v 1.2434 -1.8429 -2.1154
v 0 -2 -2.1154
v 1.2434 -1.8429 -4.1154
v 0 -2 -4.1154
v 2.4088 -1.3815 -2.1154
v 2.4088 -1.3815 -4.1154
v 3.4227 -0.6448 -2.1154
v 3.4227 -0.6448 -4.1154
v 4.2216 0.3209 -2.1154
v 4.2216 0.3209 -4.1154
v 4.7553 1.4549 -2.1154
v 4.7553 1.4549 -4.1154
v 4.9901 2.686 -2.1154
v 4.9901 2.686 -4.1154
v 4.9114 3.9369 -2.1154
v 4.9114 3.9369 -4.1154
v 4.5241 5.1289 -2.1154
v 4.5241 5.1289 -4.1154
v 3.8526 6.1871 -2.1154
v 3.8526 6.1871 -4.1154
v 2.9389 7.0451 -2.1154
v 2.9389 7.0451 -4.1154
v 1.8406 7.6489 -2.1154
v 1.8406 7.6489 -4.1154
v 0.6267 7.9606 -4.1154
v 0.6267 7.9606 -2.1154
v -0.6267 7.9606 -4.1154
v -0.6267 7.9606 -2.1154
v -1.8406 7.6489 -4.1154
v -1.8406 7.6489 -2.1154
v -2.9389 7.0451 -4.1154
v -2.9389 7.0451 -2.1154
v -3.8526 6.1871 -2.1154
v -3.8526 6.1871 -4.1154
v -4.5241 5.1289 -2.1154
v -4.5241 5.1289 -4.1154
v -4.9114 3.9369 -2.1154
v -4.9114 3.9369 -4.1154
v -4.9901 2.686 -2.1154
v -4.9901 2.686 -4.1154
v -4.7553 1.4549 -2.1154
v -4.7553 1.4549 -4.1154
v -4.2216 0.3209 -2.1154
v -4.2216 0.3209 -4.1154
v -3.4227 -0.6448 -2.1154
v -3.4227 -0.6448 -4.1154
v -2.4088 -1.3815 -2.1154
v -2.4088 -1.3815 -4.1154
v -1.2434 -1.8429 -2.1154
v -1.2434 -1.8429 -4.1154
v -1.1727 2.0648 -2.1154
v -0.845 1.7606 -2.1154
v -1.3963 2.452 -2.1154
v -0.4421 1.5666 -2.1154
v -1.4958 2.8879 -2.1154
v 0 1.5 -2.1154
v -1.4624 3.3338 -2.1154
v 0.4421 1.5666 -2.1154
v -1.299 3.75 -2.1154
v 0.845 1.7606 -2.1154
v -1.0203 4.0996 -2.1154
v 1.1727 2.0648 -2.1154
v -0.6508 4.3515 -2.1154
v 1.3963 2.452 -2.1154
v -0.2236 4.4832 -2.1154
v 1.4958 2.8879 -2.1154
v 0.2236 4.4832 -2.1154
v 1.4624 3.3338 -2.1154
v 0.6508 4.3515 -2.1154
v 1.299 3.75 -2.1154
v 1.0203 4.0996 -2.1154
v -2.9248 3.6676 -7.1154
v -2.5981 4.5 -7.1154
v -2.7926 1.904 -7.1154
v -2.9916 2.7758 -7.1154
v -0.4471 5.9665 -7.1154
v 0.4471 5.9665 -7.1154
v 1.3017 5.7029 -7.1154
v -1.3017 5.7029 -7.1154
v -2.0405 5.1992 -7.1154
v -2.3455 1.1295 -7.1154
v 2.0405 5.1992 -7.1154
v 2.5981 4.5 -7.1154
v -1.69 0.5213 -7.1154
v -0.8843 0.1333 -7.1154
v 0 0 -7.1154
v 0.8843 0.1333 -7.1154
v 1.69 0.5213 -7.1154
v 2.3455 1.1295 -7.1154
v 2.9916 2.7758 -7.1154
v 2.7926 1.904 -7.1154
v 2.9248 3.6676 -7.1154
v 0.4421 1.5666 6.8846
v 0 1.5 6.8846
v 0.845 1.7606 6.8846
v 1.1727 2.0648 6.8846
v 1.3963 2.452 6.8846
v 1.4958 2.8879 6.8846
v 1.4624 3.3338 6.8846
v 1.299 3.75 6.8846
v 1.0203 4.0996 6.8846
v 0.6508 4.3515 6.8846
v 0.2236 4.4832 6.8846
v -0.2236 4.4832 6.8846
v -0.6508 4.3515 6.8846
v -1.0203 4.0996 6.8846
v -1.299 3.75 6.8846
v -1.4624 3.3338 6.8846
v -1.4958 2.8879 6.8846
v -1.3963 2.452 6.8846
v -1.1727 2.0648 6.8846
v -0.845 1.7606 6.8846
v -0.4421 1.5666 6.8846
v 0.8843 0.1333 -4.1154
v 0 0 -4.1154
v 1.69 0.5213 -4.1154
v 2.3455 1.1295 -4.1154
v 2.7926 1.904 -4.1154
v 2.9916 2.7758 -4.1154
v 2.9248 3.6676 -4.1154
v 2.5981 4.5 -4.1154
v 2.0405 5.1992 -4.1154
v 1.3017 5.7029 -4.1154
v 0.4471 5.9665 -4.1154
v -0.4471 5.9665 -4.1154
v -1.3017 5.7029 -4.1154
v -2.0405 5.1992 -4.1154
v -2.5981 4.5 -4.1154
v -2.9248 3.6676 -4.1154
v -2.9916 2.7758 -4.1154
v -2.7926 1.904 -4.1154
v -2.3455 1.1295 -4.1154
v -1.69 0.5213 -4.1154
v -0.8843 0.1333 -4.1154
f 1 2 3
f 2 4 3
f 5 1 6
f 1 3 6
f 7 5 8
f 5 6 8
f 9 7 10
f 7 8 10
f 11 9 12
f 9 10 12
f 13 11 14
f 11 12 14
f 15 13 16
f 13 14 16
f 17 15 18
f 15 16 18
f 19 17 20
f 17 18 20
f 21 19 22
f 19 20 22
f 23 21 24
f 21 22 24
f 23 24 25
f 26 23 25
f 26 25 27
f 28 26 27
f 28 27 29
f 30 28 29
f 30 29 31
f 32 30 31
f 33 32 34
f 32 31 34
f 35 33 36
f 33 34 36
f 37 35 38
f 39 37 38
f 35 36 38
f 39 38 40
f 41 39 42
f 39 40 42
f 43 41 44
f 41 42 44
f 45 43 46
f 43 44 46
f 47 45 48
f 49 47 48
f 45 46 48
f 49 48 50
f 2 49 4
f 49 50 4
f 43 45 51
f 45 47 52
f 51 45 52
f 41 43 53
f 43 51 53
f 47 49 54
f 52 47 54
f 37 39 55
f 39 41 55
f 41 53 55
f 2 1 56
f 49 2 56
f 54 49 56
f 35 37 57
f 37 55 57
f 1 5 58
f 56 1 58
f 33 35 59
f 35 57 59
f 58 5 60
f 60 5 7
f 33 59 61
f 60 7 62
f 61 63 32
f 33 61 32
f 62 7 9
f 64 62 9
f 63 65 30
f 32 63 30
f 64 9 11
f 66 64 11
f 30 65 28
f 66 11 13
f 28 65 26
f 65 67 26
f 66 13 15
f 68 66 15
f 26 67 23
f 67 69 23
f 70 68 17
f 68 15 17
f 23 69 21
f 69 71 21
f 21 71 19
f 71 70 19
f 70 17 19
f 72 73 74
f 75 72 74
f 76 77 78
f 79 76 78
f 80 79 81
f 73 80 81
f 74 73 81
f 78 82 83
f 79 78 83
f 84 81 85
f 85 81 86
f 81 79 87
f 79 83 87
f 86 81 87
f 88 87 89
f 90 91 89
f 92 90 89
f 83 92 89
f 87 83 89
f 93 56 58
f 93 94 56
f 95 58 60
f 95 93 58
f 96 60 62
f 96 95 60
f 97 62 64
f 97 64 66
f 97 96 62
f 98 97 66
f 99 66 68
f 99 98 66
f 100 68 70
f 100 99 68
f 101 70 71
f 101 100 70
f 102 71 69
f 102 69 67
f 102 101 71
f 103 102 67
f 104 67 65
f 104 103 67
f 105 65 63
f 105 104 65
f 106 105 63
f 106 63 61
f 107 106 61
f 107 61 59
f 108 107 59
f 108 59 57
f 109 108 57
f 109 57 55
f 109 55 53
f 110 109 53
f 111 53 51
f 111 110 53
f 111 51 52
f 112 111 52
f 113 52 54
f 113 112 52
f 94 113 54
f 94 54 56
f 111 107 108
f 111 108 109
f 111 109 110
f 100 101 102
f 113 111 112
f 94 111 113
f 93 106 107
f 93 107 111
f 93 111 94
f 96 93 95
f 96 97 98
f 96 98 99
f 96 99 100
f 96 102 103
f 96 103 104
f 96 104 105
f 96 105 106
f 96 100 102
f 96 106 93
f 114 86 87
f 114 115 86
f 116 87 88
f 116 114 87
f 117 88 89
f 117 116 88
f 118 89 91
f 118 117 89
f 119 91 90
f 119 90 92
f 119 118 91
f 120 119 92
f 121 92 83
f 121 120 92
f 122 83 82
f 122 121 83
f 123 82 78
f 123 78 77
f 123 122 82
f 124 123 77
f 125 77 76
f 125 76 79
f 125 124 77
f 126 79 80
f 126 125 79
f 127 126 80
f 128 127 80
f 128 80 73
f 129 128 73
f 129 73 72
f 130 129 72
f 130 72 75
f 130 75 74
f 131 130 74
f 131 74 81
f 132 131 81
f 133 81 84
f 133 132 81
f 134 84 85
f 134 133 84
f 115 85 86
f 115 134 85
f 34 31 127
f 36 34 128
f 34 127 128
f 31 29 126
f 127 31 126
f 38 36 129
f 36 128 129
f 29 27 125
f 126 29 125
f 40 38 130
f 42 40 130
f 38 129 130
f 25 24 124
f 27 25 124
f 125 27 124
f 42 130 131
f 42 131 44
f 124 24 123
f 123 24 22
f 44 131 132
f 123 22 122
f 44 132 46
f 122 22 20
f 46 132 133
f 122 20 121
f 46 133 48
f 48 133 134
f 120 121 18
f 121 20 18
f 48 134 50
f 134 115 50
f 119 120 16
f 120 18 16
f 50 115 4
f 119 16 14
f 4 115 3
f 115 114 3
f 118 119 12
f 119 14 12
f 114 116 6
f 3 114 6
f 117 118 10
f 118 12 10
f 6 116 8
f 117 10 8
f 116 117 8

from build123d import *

# Parameters (mm, degrees)
F0_W   = 1.5
F0_H   = 9
F0_W_2 = 3
F0_H_2 = 3


with BuildPart() as f1:
    # F0 (on Right) → F1 (revolve)
    with BuildSketch(Plane.YZ):
        Polygon((3, -4.11543), (3, -2.11543), (1.5, -2.11543), (-2, -2.11543), (-2, -4.11543), (0, -4.11543), align=None)
        with Locations((2.25, 2.38457)):
            Rectangle(F0_W, F0_H)
        with Locations((1.5, -5.61543)):
            Rectangle(F0_W_2, F0_H_2)
    revolve(axis=Axis((0, 3, 2.38457), (0, 0, 1)))


solid = f1.part
